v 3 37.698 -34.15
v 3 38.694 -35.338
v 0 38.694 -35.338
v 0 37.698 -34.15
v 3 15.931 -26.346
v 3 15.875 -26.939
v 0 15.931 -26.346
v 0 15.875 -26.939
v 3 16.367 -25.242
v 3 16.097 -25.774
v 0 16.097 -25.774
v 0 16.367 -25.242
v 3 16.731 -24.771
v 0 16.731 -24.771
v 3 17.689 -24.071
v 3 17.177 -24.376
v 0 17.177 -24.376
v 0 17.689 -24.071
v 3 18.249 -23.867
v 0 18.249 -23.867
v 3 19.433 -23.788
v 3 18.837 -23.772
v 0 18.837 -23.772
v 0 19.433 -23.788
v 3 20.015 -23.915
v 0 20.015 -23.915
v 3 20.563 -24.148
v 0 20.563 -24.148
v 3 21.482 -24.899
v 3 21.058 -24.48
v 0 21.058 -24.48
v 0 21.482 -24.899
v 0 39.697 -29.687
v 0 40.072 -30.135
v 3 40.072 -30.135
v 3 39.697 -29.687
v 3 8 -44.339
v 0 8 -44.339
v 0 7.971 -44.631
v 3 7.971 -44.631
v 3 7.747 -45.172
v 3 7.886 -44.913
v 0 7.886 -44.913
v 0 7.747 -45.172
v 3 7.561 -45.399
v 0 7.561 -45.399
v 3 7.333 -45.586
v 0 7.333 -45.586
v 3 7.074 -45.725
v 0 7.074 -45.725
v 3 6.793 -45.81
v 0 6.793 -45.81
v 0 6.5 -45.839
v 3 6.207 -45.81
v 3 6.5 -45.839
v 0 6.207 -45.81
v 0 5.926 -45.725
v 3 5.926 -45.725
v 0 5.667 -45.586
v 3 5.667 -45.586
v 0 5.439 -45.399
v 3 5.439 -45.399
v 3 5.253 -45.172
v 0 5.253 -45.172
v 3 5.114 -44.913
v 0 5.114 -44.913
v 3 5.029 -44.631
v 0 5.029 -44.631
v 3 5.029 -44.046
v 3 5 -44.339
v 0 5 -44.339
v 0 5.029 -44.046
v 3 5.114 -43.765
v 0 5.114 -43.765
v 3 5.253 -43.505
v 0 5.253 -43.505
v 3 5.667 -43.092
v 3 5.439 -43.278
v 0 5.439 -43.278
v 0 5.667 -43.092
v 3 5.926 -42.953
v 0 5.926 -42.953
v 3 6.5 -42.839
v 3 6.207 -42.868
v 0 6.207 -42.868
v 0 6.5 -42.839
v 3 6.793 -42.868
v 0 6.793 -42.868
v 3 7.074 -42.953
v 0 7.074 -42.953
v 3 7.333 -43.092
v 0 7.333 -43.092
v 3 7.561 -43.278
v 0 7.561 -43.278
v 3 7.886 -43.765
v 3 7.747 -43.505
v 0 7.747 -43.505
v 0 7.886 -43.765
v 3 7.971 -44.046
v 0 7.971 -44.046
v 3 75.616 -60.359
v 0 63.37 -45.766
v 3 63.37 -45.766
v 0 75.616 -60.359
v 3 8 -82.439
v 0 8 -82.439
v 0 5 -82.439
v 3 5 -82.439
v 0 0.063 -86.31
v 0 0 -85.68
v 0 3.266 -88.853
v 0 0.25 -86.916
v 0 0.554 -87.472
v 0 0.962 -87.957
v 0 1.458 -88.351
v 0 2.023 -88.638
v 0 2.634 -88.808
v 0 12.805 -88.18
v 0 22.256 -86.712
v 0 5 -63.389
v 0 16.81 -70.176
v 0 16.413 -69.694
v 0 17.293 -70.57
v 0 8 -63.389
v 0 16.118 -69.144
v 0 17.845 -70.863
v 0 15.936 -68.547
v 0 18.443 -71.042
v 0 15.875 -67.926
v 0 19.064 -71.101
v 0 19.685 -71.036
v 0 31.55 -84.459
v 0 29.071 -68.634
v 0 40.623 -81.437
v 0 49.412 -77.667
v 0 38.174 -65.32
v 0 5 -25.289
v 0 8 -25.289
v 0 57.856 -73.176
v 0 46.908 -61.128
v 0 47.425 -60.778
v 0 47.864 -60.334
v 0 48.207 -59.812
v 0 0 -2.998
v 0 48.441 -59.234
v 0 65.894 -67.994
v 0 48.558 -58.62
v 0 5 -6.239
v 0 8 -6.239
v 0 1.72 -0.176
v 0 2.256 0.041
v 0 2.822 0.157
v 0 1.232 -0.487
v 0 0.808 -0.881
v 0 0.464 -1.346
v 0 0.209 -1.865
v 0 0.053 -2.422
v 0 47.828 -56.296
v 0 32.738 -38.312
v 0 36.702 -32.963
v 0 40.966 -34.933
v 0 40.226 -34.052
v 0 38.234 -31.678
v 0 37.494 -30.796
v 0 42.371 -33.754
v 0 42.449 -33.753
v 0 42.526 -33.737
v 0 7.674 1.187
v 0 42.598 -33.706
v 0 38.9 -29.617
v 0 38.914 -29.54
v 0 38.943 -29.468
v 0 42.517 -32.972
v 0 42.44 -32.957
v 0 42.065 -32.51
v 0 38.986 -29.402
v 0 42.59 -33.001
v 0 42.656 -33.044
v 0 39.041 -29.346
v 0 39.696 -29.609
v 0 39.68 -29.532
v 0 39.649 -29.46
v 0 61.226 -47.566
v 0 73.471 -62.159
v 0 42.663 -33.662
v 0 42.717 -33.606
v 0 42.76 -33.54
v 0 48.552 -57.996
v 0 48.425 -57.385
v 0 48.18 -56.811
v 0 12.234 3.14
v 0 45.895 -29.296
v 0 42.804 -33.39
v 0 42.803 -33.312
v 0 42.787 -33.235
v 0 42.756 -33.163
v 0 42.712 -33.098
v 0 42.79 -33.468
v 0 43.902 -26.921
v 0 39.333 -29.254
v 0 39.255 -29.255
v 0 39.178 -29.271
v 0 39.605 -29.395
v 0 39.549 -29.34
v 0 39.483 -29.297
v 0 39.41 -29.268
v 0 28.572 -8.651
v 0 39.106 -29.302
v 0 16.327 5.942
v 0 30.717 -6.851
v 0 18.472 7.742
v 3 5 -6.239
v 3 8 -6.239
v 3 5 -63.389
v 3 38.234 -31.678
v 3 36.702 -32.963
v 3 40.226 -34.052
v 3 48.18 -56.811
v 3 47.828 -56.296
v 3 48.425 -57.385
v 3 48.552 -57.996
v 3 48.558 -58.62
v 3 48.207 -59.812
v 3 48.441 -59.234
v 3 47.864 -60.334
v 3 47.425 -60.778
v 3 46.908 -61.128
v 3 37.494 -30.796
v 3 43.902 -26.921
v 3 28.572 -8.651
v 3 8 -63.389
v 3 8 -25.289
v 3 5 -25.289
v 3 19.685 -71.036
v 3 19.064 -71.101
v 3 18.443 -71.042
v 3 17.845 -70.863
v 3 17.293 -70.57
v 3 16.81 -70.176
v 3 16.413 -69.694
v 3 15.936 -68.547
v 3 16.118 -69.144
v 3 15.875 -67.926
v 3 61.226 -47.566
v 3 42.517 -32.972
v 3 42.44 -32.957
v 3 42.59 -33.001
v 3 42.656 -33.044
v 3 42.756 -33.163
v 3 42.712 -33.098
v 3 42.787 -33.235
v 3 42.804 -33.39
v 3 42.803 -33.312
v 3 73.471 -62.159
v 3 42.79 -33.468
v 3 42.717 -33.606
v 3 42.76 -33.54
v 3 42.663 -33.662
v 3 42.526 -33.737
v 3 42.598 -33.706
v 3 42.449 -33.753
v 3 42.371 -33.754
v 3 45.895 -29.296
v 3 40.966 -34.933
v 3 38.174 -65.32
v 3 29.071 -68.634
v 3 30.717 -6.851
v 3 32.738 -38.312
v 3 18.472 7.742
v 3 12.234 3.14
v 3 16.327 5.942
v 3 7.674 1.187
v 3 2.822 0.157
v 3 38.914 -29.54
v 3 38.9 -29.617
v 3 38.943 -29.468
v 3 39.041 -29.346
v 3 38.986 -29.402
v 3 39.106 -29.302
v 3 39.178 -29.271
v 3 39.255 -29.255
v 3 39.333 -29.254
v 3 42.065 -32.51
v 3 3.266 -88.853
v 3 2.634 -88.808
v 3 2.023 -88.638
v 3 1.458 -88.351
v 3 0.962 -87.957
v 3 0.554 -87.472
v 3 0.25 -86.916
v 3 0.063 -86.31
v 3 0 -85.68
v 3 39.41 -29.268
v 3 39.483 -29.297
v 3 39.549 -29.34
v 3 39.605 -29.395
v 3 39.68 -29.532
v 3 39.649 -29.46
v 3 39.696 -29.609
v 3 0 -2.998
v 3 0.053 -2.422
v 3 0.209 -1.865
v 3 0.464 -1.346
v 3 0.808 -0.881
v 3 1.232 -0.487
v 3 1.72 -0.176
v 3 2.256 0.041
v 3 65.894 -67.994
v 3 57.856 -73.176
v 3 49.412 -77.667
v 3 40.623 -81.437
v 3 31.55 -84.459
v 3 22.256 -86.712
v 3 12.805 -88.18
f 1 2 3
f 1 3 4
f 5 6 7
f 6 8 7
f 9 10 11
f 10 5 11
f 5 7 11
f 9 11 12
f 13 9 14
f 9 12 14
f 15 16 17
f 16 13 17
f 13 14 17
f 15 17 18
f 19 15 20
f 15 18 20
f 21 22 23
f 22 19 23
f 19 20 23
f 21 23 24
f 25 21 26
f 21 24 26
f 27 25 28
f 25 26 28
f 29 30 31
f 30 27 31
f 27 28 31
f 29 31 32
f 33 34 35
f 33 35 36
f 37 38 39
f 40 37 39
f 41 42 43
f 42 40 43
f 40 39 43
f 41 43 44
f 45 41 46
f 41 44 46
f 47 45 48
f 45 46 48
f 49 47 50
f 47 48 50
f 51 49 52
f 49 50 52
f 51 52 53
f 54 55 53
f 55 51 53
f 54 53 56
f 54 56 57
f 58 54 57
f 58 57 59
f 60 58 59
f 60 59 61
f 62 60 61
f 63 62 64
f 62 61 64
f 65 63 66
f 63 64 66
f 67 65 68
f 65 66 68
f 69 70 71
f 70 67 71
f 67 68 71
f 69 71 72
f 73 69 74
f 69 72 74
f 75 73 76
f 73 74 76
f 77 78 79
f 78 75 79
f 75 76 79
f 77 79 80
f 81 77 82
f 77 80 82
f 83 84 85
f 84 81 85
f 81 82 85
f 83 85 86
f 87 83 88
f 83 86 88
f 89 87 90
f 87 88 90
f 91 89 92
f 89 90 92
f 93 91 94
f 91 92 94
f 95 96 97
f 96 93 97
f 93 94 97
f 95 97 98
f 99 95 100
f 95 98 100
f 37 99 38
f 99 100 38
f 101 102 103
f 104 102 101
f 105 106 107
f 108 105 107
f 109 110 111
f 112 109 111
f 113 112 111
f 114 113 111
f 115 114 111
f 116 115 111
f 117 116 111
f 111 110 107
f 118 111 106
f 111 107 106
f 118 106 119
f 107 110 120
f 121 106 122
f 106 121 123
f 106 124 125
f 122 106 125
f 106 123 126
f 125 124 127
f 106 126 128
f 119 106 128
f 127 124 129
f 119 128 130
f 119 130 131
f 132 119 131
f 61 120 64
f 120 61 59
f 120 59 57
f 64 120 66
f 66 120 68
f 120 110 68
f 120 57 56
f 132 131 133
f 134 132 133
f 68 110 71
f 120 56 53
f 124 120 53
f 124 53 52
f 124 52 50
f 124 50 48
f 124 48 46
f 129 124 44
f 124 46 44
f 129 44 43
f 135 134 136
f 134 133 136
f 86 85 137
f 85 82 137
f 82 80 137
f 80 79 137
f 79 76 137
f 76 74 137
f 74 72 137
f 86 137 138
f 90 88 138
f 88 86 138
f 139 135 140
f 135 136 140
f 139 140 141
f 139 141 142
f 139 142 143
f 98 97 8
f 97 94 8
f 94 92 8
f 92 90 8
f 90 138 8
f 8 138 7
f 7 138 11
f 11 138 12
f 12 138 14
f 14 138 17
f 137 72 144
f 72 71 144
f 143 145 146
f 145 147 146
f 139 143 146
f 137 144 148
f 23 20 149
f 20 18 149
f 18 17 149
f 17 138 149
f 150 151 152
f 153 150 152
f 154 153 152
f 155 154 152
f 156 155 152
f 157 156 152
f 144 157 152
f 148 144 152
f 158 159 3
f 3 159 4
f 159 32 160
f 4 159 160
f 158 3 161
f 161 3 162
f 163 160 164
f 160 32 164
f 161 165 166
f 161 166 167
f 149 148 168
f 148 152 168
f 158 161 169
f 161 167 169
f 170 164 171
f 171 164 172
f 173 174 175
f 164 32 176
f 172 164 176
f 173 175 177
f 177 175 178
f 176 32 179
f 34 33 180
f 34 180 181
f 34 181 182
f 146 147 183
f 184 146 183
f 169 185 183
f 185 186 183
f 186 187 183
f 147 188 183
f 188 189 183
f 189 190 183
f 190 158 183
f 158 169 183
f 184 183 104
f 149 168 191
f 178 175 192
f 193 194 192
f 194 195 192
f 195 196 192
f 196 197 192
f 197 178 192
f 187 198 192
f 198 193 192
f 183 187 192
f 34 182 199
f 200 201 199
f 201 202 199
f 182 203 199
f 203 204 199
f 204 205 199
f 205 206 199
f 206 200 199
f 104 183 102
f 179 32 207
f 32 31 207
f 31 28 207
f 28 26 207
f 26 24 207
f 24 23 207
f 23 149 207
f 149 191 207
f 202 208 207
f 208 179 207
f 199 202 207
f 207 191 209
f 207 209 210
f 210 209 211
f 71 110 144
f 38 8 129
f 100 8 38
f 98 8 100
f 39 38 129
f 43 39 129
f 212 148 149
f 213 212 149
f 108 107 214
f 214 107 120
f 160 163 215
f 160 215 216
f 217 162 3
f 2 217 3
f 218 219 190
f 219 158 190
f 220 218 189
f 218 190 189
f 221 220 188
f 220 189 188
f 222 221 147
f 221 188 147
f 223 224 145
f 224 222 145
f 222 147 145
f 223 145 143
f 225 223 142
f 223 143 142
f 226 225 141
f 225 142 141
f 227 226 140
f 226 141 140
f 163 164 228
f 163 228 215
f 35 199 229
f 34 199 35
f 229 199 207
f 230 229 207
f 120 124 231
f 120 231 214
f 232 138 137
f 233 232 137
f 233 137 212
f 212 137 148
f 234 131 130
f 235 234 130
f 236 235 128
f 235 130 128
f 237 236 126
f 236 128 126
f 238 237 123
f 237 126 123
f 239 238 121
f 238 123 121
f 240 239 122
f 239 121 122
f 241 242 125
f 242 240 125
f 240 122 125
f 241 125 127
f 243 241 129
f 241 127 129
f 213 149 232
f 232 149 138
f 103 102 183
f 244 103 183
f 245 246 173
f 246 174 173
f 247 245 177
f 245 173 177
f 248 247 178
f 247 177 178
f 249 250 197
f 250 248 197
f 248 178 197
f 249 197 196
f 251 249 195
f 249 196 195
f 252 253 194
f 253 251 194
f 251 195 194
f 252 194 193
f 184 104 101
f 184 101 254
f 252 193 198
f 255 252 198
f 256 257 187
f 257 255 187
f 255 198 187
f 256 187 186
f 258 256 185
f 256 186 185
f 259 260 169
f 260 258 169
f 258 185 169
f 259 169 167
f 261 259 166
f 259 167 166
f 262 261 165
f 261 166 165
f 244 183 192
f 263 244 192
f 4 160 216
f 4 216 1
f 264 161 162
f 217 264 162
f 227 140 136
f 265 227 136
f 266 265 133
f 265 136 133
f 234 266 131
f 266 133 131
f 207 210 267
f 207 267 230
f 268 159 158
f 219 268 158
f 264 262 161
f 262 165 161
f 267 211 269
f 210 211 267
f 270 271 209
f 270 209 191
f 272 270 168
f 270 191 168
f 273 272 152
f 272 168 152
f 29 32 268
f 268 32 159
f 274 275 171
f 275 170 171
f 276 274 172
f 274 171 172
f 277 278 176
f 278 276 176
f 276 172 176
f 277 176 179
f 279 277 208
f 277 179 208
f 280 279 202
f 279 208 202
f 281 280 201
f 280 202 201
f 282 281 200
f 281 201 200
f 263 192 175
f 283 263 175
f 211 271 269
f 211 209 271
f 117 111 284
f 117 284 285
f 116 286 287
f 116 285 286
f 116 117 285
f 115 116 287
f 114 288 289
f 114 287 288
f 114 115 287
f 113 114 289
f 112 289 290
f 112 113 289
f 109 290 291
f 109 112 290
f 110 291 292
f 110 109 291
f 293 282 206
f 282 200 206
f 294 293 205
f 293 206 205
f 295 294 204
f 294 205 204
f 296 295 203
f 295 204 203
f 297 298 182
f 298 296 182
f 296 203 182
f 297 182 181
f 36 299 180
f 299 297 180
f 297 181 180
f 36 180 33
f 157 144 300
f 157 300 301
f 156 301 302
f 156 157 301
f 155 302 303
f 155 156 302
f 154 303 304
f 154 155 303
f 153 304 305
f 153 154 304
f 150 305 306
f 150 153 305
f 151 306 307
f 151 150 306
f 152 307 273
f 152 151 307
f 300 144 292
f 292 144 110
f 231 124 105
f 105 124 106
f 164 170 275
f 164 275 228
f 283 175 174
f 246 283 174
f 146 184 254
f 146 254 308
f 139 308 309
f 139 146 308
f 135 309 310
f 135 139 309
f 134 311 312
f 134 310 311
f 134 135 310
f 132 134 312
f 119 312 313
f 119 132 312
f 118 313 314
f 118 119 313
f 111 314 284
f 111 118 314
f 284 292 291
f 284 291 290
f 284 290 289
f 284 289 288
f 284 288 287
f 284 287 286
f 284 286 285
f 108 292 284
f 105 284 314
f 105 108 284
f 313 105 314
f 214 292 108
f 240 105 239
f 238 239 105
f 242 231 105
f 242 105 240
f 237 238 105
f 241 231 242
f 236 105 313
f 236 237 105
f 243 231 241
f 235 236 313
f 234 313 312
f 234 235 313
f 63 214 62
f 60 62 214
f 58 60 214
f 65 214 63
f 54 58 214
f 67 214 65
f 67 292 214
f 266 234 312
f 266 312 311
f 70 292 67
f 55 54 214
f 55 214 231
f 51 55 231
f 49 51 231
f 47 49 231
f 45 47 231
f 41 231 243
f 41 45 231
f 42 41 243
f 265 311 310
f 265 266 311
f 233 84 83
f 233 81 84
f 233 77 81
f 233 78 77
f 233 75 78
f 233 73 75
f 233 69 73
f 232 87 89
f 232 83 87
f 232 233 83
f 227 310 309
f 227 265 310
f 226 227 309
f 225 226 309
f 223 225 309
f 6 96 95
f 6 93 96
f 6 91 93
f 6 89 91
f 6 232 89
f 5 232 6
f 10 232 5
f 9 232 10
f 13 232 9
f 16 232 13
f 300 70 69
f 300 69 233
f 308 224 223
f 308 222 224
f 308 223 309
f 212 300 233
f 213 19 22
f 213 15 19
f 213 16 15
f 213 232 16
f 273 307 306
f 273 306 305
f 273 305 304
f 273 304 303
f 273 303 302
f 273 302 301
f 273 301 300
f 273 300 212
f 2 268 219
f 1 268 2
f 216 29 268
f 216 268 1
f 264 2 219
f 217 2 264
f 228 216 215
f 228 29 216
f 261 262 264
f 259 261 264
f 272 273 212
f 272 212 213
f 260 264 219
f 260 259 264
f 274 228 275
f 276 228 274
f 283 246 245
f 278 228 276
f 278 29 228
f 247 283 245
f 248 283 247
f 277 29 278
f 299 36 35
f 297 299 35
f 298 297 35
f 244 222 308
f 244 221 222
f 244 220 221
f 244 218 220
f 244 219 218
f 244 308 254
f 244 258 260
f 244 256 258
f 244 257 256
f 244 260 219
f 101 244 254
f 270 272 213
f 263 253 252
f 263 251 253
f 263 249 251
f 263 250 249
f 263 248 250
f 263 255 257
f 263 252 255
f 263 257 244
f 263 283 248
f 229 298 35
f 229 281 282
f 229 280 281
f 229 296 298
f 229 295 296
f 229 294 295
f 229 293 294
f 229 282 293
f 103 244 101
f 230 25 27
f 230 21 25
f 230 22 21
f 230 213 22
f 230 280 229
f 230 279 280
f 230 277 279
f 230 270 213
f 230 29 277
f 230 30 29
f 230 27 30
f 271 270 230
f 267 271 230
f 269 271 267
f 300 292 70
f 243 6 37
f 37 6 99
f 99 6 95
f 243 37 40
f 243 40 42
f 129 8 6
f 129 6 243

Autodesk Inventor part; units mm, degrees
ref_plane "YZ Plane" through (0, 0, 0) normal (1, 0, 0) x (0, 1, 0)
ref_plane "XZ Plane" through (0, 0, 0) normal (0, 1, 0) x (-1, 0, 0)
ref_plane "XY Plane" through (0, 0, 0) normal (0, 0, 1) x (1, 0, 0)
sketch "Sketch1" plane through (0, 0, 0) normal (1, 0, 0) x (0, 1, 0)
  line L0 (18.4717, 7.7423) -> (30.7168, -6.8509)
  line L1 (75.6155, -60.3591) -> (73.4706, -62.1589)
  line L2 (73.4706, -62.1589) -> (61.2255, -47.5657) construction
  line L3 (16.3268, 5.9425) -> (18.4717, 7.7423)
  line L4 (30.7168, -6.8509) -> (28.5719, -8.6507)
  line L5 (63.3704, -45.7659) -> (61.2255, -47.5657)
  line L6 (30.7168, -6.8509) -> (63.3704, -45.7659) construction
  line L7 (63.3704, -45.7659) -> (75.6155, -60.3591)
  line L8 (61.2255, -47.5657) -> (45.895, -29.2956)
  line L9 (28.5719, -8.6507) -> (16.3268, 5.9425) construction
  arc A0 (2.8222, 0.1573) -> (16.3268, 5.9425) centre (0, 25.4) ccw
  line L10 (0, -2.9981) -> (0, -85.6796)
  arc A1 (3.2657, -88.8533) -> (73.4706, -62.1589) centre (0, 25.4) ccw
  arc A2 (2.8222, 0.1573) -> (0, -2.9981) centre (3.175, -2.9981) ccw
  arc A3 (0, -85.6796) -> (3.2657, -88.8533) centre (3.175, -85.6796) ccw
  line L11 (5, -6.2388) -> (8, -6.2388)
  line L12 (8, -6.2388) -> (8, -25.2888)
  line L13 (8, -82.4388) -> (5, -82.4388)
  line L14 (5, -82.4388) -> (5, -63.3888)
  line L15 (8, -25.2888) -> (5, -25.2888)
  line L16 (8, -63.3888) -> (5, -63.3888)
  line L17 (8, -25.2888) -> (8, -63.3888) construction
  line L18 (5, -25.2888) -> (5, -6.2388)
  line L19 (5, -63.3888) -> (5, -25.2888) construction
  line L20 (8, -63.3888) -> (8, -82.4388)
  circle A4 centre (6.5, -44.3388) radius 1.5
  line L21 (51.7389, -22.3686) -> (29.8853, -40.706)
  line L22 (43.9024, -26.9208) -> (40.0722, -30.1348)
  line L23 (40.0722, -30.1348) -> (39.6966, -29.6872)
  line L24 (39.333, -29.2538) -> (38.8996, -29.6174) construction
  line L25 (37.4945, -30.7965) -> (38.2337, -31.6775)
  line L26 (38.2337, -31.6775) -> (36.7016, -32.963)
  line L27 (36.7016, -32.963) -> (37.6979, -34.1504)
  arc A5 (39.6966, -29.6872) -> (39.333, -29.2538) centre (39.2981, -29.6523) ccw
  line L28 (39.6966, -29.6872) -> (39.333, -29.2538) construction
  line L29 (38.8996, -29.6174) -> (37.4945, -30.7965)
  arc A6 (39.333, -29.2538) -> (38.8996, -29.6174) centre (39.2981, -29.6523) ccw
  line L30 (45.895, -29.2956) -> (42.0648, -32.5095)
  line L31 (42.0648, -32.5095) -> (42.4404, -32.9571)
  line L32 (40.9655, -34.9332) -> (40.2263, -34.0522)
  line L33 (40.2263, -34.0522) -> (38.6942, -35.3378)
  line L34 (38.6942, -35.3378) -> (37.6979, -34.1504)
  arc A7 (42.804, -33.3905) -> (42.4404, -32.9571) centre (42.4055, -33.3556) ccw
  line L35 (42.3707, -33.7541) -> (40.9655, -34.9332)
  arc A8 (42.3707, -33.7541) -> (42.804, -33.3905) centre (42.4055, -33.3556) ccw
  line L36 (43.9024, -26.9208) -> (28.5719, -8.6507)
  line L37 (45.895, -29.2956) -> (43.9024, -26.9208)
  line L38 (15.875, -26.9394) -> (15.875, -67.9256)
  line L39 (21.4822, -24.8986) -> (47.8276, -56.2958)
  arc A9 (19.685, -71.0364) -> (46.9085, -61.1279) centre (0, 25.4) ccw
  arc A10 (21.4822, -24.8986) -> (15.875, -26.9394) centre (19.05, -26.9394) ccw
  arc A11 (15.875, -67.9256) -> (19.685, -71.0364) centre (19.05, -67.9256) ccw
  arc A12 (46.9085, -61.1279) -> (47.8276, -56.2958) centre (45.3954, -58.3366) ccw
  point P0 (0, 0)
  point P1 (0, 0)
  point P2 (0, -88.9)
  point P3 (75.5935, -60.3328)
  point P4 (0, -44.3388)
  point P5 (5, -44.3388)
  point P6 (6.5, -25.2888)
  point P7 (44.8987, -28.1082)
  point P8 (15.875, -71.7363)
  point P9 (50.2771, -59.215)
  point P10 (15.875, -71.7363)
  dimension "d0" = 2.8
  dimension "d1" = 88.9
  dimension "d2" = 19.05
  dimension "d3" = 19.05
  dimension "d4" = 40
  dimension "d5" = 25.4
  dimension "d6" = 3.175
  dimension "d7" = 3
  dimension "d8" = 76.2
  dimension "d9" = 5
  dimension "d10" = 19.05
  dimension "d11" = 3
  dimension "d12" = 3.1
  dimension "d13" = 5.4
  dimension "d14" = 5
  dimension "d15" = 0.4
  dimension "d16" = 2.4
  dimension "d17" = 2
  dimension "d22" = 15.875
  dimension "d23" = 15.875
  dimension "d24" = 15.875
  dimension "d25" = 3.175
extrude "Extrusion1" add sketch "Sketch1" along normal blind 3 contours L0 L4 L36 L22 L23 A5 A6 L29 L25 L26 L27 L34 L33 L32 L35 A8 A7 L31 L30 L8 L5 L7 L1 A1 A3 L10 A2 A0 L3
equation "\"d3\" = d2"
equation "\"d23\" = d22"
equation "\"d24\" = d22"
properties part number "SideMount"
